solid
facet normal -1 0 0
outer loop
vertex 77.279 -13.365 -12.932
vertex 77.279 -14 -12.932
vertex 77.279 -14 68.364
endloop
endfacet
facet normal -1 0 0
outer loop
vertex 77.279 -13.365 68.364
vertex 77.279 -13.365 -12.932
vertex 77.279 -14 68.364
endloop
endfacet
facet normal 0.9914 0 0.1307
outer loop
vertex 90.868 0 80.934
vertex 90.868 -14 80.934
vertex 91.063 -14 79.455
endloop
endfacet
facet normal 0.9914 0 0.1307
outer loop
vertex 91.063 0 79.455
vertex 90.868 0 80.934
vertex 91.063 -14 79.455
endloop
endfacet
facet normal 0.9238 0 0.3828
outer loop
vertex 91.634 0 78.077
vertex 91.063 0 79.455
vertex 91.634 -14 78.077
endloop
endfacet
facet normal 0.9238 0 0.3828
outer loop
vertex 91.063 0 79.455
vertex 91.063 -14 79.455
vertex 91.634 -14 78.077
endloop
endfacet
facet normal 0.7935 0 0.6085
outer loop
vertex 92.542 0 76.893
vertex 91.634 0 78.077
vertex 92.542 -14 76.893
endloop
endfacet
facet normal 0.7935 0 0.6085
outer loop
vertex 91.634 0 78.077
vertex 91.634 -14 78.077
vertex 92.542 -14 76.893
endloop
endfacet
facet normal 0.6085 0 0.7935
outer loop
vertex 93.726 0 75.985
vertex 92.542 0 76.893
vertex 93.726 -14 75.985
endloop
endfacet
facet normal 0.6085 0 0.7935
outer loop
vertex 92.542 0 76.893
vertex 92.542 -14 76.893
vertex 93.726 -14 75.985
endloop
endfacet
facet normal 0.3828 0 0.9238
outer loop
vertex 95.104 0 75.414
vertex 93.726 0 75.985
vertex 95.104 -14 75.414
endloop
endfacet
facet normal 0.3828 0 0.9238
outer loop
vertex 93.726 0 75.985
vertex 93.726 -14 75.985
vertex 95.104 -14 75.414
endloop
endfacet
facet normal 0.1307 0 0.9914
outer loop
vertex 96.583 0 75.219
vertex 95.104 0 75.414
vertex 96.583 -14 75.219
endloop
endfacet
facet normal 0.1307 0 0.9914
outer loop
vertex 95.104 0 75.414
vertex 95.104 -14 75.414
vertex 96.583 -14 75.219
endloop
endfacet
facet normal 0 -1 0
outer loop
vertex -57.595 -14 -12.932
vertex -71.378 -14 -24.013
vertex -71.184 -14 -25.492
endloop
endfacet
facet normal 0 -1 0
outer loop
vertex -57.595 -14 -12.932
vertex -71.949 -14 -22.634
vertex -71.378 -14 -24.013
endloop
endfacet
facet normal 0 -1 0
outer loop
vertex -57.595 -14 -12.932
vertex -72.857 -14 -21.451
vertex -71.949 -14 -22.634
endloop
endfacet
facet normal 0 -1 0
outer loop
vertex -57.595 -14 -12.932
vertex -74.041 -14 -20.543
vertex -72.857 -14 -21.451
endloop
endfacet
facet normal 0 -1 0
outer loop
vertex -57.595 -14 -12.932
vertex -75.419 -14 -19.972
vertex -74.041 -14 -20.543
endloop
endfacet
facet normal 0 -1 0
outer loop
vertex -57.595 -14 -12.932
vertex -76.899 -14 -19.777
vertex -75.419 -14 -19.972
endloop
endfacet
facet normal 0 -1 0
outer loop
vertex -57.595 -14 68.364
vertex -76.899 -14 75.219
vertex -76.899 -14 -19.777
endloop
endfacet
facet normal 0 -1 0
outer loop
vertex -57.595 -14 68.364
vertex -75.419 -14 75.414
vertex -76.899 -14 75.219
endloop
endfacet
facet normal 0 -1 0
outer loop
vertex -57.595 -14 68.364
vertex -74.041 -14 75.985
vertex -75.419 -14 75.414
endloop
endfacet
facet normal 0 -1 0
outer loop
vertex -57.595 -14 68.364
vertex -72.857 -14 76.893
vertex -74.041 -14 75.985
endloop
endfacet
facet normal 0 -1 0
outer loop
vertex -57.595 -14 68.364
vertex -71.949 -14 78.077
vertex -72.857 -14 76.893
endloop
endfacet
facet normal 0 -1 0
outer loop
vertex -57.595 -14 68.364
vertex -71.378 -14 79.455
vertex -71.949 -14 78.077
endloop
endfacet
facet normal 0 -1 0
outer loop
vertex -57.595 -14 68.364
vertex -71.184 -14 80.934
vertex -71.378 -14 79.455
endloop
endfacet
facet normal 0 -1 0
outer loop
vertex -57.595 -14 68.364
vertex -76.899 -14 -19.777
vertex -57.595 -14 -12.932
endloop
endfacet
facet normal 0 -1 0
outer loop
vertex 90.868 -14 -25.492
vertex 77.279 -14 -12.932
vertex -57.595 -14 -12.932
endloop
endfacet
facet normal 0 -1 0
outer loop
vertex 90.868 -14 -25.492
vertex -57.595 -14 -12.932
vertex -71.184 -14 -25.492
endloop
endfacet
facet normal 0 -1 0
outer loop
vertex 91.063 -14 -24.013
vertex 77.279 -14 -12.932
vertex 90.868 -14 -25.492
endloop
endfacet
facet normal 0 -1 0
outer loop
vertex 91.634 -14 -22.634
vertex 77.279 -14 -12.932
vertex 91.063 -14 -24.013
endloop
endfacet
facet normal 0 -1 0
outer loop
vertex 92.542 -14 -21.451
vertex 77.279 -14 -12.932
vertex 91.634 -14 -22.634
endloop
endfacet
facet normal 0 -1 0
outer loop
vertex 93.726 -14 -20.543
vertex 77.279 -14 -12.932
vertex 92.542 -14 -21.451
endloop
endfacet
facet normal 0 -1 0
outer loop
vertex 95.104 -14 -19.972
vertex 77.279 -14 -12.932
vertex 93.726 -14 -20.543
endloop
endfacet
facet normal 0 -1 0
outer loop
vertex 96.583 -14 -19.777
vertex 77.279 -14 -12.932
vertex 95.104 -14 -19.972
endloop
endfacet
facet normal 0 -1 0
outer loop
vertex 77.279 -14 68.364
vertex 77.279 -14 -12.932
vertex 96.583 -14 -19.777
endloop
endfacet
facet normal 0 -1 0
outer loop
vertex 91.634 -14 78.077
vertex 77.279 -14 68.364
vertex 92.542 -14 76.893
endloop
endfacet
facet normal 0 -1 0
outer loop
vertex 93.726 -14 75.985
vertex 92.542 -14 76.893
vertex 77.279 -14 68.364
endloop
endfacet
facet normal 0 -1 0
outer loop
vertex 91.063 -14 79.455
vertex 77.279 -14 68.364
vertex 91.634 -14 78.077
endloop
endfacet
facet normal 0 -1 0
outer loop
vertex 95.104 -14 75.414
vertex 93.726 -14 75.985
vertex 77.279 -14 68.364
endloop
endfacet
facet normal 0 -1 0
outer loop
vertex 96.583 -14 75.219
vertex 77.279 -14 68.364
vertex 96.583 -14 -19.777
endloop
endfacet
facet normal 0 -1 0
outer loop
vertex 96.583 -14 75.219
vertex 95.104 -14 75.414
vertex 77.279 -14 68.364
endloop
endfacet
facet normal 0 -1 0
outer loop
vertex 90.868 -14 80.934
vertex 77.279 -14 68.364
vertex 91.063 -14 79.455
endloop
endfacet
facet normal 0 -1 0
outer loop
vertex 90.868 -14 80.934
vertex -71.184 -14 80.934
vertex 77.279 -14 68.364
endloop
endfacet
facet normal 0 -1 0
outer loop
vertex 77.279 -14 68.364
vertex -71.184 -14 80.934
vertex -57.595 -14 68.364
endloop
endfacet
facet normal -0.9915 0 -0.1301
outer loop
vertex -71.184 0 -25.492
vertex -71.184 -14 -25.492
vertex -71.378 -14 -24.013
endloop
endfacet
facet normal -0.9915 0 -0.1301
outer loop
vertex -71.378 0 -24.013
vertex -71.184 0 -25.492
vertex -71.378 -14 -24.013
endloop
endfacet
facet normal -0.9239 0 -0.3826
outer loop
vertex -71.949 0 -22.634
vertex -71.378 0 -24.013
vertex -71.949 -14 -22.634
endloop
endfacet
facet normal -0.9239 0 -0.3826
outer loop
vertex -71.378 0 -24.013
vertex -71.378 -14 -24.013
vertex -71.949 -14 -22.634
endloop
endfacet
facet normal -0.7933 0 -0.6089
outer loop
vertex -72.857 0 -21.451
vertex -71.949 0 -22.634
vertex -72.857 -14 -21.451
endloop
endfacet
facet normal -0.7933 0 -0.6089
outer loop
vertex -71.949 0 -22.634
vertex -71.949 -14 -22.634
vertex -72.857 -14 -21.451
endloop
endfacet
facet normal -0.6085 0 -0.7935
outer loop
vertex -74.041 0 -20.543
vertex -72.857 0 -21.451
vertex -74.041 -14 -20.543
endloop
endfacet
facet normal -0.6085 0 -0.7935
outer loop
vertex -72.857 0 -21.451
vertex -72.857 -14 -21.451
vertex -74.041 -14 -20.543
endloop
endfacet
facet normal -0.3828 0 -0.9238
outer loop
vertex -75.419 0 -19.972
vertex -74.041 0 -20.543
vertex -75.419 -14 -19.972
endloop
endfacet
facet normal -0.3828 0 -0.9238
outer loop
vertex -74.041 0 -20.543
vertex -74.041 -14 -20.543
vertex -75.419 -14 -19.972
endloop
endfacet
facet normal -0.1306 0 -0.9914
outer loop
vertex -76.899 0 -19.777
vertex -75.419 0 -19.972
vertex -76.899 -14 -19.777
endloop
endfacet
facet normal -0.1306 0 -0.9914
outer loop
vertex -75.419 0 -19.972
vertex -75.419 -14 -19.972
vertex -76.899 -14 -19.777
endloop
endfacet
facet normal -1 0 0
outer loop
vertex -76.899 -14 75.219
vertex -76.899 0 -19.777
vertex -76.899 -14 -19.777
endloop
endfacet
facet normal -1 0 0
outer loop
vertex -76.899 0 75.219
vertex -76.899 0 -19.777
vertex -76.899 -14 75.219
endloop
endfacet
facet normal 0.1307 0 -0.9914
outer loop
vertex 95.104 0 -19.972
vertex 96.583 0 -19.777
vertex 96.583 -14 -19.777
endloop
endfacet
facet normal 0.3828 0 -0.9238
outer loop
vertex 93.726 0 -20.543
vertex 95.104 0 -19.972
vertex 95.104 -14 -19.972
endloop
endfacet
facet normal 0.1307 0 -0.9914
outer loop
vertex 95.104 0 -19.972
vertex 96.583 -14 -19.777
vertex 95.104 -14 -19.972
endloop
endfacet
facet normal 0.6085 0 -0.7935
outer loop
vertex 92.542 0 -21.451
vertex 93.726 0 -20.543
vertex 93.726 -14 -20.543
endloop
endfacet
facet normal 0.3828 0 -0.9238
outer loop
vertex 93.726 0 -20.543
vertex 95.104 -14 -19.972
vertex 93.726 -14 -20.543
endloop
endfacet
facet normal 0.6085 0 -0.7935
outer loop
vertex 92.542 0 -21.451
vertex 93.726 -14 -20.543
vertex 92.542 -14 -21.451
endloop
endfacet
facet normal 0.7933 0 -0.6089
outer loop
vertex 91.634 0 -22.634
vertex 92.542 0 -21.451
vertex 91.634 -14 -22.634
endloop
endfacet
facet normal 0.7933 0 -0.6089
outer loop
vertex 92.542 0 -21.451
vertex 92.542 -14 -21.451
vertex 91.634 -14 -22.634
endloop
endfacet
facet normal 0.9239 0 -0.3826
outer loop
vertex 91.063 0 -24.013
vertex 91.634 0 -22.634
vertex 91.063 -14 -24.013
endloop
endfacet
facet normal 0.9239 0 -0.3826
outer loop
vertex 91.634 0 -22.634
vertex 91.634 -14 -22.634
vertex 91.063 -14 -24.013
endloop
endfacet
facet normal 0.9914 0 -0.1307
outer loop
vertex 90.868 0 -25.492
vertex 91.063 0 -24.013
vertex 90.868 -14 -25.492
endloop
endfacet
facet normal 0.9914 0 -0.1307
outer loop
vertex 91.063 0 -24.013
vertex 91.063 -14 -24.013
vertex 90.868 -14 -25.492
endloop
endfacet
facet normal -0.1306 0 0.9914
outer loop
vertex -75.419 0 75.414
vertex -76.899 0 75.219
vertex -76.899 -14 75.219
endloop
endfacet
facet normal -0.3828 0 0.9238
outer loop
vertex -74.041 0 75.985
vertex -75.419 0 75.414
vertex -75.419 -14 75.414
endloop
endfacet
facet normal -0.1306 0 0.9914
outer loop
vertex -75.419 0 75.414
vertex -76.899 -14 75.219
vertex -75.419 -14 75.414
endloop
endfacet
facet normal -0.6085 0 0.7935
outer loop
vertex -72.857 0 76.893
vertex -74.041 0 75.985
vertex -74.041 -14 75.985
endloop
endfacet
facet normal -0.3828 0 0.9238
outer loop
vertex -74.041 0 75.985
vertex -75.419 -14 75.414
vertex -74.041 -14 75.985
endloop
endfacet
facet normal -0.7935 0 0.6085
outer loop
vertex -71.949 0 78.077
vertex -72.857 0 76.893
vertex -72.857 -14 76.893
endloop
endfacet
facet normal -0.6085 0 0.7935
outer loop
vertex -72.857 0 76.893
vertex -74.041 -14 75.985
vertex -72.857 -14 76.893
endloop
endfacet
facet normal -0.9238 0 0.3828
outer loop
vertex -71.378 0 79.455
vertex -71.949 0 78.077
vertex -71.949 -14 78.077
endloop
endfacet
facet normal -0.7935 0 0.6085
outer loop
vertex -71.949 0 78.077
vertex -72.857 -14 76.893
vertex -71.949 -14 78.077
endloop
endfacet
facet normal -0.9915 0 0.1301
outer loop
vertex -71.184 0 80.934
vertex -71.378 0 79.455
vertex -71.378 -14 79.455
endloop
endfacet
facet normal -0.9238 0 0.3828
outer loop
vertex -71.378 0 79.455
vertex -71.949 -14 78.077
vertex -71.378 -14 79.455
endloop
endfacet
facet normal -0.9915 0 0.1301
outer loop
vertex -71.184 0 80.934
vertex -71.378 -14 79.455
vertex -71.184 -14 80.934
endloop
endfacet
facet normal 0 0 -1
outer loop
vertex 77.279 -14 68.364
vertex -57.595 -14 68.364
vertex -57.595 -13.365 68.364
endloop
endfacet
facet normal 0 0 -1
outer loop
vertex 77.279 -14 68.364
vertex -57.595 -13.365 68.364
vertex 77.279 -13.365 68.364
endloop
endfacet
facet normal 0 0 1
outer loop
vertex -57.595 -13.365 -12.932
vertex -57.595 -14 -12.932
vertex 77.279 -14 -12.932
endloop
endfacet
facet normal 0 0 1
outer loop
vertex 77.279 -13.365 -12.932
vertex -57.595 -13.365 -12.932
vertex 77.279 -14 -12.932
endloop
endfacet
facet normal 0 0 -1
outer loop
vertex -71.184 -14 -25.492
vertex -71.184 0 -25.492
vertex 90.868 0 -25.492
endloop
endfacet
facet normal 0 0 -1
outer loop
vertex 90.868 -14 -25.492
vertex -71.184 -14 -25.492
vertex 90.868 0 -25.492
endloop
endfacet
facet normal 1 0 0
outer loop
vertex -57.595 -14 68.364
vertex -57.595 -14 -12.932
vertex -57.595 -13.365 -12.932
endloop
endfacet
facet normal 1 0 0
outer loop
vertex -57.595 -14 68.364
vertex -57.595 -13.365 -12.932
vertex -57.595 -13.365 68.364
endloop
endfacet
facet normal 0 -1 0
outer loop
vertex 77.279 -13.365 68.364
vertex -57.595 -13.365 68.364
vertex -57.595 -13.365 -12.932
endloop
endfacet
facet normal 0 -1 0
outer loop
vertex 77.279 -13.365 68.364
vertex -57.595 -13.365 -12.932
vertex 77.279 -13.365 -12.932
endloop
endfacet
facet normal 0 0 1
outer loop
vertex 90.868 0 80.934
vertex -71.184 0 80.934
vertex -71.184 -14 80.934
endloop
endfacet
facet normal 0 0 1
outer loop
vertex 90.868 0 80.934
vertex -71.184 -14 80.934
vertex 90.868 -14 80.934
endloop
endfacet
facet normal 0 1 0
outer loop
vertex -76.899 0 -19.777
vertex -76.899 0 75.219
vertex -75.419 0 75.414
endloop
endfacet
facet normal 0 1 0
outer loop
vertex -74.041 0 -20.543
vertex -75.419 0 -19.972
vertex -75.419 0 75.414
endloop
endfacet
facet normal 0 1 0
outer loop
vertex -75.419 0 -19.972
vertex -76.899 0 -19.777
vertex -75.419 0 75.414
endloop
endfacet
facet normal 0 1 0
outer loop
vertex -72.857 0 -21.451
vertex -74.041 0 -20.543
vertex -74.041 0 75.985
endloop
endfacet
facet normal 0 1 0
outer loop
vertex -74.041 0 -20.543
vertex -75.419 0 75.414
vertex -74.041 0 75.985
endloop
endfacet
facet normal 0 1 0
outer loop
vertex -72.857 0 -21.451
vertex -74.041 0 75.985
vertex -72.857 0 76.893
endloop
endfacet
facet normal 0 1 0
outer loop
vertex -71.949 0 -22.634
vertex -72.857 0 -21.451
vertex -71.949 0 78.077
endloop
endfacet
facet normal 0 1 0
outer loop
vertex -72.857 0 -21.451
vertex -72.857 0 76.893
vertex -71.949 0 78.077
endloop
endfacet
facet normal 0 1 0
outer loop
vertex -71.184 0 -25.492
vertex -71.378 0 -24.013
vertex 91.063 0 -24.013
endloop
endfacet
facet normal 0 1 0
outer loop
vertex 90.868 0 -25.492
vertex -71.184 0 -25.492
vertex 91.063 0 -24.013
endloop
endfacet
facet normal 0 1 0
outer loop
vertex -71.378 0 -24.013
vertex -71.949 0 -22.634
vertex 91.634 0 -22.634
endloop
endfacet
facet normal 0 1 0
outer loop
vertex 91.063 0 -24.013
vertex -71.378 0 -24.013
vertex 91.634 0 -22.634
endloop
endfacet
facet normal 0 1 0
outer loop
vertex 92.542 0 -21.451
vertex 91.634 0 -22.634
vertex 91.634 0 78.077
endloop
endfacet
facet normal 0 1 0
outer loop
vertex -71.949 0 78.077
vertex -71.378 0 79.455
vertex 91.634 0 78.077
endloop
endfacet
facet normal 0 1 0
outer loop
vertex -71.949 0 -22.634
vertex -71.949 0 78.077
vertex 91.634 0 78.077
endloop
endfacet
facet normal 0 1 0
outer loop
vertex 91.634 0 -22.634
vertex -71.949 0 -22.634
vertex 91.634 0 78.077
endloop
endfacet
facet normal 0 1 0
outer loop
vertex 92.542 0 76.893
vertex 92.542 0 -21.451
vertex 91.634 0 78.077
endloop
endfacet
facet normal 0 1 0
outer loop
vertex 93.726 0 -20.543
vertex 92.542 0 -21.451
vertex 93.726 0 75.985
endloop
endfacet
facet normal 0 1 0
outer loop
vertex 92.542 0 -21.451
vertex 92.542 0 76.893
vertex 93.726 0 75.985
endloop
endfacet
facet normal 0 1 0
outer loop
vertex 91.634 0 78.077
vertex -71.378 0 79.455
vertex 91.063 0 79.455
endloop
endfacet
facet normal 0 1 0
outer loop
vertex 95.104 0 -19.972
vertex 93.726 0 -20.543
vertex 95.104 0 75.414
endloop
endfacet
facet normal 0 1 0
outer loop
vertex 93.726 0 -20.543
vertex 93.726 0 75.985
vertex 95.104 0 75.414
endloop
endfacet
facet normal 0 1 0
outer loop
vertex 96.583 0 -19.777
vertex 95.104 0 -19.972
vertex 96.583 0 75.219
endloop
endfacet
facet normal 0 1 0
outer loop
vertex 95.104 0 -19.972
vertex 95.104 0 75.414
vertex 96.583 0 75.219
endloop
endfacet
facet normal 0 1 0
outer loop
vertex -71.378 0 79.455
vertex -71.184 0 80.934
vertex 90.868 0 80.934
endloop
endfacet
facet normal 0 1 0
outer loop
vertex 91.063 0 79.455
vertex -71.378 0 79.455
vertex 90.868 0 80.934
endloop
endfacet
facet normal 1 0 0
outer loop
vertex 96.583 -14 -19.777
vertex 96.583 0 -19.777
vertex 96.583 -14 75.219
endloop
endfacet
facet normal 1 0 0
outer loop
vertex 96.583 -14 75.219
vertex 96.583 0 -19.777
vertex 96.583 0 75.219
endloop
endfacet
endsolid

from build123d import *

# Parameters (mm, degrees)
F0_W     = 173.482
F0_H     = 106.426
F1_DEPTH = 14
F2_W     = 134.874
F2_H     = 81.295477
F3_DEPTH = 0.635
F4_R     = 5.715
F5_DEPTH = 25.4


with BuildPart() as f1:
    # F0 (on Front) → F1 (new body)
    with BuildSketch(Plane.XZ):
        with Locations((9.842499, 27.721002)):
            Rectangle(F0_W, F0_H)
    extrude(amount=F1_DEPTH)

    # F2 (on face) → F3 (cut)
    with BuildSketch(Plane.XZ.offset(14)):
        with Locations((9.842499, 27.71604)):
            Rectangle(F2_W, F2_H)
    extrude(amount=-F3_DEPTH, mode=Mode.SUBTRACT)

    # F4 (on face) → F5 (cut)
    with BuildSketch(Plane.XZ.offset(14)):
        with Locations((-76.898501, 80.934002)):
            Circle(F4_R)
        with Locations((-76.898501, -25.491998)):
            Circle(F4_R)
        with BuildLine():
            ThreePointArc((102.298499, -25.491998), (96.583499, -19.776998), (90.868499, -25.491998))
            ThreePointArc((90.868499, -25.491998), (96.583499, -31.206998), (102.298499, -25.491998))
        make_face()
        with BuildLine():
            ThreePointArc((102.298499, 80.934002), (96.583499, 86.649002), (90.868499, 80.934002))
            ThreePointArc((90.868499, 80.934002), (96.583499, 75.219002), (102.298499, 80.934002))
        make_face()
    extrude(amount=-F5_DEPTH, mode=Mode.SUBTRACT)


solid = f1.part
